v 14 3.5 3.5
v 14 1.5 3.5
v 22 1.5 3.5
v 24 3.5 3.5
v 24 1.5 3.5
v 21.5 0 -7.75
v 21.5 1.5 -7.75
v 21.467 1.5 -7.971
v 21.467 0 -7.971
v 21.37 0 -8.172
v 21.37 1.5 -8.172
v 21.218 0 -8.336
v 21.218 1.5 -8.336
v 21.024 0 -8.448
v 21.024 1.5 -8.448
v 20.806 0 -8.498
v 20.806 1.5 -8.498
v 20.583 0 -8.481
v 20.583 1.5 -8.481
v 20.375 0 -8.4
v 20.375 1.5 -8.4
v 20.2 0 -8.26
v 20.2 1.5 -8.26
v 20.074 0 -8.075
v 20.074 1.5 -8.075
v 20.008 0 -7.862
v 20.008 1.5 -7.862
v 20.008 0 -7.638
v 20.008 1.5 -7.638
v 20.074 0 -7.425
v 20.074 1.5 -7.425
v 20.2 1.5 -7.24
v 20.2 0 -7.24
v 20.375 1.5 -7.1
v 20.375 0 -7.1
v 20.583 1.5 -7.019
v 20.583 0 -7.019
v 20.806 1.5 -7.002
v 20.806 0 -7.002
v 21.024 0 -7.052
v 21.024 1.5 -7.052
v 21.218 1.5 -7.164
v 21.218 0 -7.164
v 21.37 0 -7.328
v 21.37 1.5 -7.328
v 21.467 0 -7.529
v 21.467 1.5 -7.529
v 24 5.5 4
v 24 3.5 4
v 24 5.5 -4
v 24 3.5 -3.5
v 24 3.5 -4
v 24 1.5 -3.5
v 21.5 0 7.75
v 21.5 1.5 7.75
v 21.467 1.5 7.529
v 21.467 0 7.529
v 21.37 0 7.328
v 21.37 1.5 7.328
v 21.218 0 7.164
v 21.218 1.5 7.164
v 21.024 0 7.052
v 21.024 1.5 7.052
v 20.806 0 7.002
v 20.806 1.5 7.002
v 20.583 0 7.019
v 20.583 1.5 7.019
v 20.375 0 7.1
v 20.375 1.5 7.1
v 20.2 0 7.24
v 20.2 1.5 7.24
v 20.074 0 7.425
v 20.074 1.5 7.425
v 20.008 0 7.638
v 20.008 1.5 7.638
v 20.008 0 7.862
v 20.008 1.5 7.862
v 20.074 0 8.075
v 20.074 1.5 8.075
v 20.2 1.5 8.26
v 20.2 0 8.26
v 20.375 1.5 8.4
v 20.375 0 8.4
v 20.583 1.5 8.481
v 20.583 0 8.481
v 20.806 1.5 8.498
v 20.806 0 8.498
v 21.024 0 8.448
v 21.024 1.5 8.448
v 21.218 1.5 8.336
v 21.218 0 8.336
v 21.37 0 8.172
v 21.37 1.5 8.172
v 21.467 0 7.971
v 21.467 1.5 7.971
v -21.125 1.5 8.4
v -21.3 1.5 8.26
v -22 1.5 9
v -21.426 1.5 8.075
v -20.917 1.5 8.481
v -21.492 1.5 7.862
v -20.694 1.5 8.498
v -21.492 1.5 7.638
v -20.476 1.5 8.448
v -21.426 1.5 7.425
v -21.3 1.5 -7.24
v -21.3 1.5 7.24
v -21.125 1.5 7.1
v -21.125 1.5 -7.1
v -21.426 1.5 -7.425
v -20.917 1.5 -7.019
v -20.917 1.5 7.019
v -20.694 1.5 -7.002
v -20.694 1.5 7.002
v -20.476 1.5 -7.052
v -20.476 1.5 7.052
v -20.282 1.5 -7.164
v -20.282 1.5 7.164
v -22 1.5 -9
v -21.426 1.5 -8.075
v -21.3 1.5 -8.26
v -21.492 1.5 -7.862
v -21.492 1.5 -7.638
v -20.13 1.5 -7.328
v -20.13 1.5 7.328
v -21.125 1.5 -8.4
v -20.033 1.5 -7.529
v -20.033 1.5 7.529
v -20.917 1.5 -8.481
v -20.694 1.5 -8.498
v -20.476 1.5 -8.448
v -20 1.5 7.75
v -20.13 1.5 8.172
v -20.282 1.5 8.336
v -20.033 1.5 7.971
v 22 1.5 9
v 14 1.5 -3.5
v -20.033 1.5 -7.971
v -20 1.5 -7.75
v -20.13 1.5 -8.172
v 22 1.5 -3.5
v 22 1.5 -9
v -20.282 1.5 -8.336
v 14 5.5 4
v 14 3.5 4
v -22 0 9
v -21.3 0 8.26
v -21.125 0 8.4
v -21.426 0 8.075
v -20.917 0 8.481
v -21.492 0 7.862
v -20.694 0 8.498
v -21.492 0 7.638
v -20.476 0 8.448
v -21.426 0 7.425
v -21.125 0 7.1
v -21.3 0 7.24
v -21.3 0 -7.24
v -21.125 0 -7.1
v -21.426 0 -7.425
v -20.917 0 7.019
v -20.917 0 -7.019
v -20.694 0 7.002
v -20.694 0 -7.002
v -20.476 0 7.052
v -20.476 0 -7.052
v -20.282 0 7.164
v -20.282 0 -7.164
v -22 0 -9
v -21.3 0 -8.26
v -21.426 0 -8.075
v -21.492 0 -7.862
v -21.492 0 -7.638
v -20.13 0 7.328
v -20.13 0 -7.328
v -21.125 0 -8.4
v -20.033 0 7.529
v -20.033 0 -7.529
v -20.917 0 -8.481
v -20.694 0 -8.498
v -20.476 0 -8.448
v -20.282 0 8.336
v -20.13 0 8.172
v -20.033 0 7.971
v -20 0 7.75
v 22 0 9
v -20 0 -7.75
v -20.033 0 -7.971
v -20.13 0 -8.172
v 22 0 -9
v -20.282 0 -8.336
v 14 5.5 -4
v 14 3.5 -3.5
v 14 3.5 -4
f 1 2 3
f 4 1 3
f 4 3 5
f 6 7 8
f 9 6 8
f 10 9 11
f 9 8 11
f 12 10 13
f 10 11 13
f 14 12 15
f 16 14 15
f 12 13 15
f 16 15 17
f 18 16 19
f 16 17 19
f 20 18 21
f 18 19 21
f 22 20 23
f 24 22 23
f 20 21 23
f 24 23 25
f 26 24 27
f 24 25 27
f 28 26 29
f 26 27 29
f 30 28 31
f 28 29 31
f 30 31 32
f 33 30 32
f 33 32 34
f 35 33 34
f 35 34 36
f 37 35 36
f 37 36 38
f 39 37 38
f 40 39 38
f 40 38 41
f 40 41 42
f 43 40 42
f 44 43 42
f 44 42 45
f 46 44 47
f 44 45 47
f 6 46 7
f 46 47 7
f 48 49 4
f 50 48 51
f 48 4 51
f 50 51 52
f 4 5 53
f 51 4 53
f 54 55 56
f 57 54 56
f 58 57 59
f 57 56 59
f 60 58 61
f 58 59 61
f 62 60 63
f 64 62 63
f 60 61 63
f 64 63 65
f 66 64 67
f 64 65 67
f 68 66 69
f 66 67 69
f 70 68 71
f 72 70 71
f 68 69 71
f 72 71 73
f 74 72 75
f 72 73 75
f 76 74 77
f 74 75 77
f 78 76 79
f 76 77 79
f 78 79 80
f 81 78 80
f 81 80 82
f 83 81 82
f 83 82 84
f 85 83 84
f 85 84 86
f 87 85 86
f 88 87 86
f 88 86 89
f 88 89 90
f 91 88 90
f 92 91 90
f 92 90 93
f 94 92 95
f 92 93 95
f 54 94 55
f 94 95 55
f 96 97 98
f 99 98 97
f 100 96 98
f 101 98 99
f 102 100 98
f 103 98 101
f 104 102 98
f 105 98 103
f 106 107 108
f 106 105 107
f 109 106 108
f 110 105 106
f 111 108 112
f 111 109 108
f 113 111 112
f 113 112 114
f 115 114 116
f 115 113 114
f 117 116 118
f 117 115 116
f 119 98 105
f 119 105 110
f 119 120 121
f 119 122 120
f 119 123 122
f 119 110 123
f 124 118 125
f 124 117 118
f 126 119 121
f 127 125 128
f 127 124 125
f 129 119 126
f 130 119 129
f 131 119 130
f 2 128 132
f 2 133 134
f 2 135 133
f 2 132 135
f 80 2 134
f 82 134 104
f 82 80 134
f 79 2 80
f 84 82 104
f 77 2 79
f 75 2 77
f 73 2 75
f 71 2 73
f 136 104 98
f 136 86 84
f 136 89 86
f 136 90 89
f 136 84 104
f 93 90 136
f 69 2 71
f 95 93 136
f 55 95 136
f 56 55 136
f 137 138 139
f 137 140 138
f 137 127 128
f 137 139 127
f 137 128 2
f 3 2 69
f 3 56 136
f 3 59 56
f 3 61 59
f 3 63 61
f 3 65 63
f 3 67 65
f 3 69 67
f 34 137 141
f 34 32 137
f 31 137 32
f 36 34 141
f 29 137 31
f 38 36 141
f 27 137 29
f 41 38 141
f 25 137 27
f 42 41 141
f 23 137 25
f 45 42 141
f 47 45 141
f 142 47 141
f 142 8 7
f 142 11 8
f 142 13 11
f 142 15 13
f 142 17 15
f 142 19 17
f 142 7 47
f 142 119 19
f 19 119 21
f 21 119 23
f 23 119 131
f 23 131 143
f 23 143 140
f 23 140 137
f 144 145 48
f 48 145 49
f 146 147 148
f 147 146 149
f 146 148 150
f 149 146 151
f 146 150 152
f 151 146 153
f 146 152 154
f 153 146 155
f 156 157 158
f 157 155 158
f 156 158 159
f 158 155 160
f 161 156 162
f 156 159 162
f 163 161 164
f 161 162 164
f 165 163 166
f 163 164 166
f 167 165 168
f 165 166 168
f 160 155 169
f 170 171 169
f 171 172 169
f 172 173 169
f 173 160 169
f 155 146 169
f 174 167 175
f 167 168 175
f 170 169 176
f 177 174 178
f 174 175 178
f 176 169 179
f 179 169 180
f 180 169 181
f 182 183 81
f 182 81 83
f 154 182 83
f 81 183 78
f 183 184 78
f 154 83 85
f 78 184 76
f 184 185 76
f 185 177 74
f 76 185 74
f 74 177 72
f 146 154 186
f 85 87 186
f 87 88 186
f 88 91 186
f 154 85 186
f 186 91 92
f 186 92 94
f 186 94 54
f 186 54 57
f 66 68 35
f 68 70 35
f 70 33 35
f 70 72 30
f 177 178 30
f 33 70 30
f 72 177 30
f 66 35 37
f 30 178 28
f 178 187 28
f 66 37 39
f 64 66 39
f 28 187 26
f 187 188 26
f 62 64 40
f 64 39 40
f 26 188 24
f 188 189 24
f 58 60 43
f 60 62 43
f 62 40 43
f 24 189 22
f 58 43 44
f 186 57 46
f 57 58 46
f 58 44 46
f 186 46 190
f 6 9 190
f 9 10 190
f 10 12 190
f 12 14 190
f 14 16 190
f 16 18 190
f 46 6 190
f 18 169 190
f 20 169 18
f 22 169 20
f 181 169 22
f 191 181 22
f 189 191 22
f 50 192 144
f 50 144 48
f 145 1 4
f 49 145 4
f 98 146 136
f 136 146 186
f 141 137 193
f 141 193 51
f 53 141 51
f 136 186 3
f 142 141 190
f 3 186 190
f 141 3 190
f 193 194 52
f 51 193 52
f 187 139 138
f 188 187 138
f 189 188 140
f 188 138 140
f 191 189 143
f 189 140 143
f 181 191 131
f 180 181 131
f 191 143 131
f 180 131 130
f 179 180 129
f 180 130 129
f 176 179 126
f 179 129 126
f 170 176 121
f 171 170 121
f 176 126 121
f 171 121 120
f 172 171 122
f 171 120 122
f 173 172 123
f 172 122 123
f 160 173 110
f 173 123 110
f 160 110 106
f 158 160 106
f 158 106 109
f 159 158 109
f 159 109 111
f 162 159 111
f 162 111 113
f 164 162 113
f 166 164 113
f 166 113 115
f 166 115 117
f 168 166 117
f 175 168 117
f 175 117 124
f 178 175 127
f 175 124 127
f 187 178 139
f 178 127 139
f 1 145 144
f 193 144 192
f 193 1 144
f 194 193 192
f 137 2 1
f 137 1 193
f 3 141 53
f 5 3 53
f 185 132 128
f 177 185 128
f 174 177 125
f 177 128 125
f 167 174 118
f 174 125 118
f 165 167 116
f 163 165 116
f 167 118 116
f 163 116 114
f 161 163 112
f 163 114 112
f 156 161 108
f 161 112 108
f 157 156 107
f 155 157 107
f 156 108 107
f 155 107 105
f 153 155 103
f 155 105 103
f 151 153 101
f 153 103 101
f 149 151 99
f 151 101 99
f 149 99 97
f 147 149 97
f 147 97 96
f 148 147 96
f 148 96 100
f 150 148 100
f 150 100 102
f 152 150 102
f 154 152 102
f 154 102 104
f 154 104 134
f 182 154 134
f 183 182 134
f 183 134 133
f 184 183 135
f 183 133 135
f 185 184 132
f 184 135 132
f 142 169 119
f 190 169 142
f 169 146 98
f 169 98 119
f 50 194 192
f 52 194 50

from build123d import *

# Parameters (mm, degrees)
SCHIZZO1_W                   = 44
SCHIZZO1_H                   = 18
ESTRUSIONE_ESTRUSIONE1_DEPTH = 1.5
SCHIZZO2_R                   = 0.75
TAGLIO_ESTRUSIONE1_DEPTH     = 1.5
SCHIZZO4_W                   = 10
SCHIZZO4_H                   = 7
ESTRUSIONE_ESTRUSIONE2_DEPTH = 2
SCHIZZO5_W                   = 10
SCHIZZO5_H                   = 8
ESTRUSIONE_ESTRUSIONE3_DEPTH = 2


with BuildPart() as part:
    # Schizzo1 → Estrusione-Estrusione1 (new body)
    with BuildSketch(Plane(origin=(0, 0, 0), x_dir=(1, 0, 0), z_dir=(0, 1, 0))):
        Rectangle(SCHIZZO1_W, SCHIZZO1_H)
    extrude(amount=ESTRUSIONE_ESTRUSIONE1_DEPTH)

    # Schizzo2 → Taglio-Estrusione1 (cut)
    with BuildSketch(Plane(origin=(0, 1.5, 0), x_dir=(1, 0, 0), z_dir=(0, 1, 0))):
        with Locations((-20.75, 7.75)):
            Circle(SCHIZZO2_R)
        with Locations((20.75, 7.75)):
            Circle(SCHIZZO2_R)
        with Locations((20.75, -7.75)):
            Circle(SCHIZZO2_R)
        with Locations((-20.75, -7.75)):
            Circle(SCHIZZO2_R)
    extrude(amount=-TAGLIO_ESTRUSIONE1_DEPTH, mode=Mode.SUBTRACT)

    # Schizzo4 → Estrusione-Estrusione2 (add)
    with BuildSketch(Plane(origin=(0, 1.5, 0), x_dir=(1, 0, 0), z_dir=(0, 1, 0))):
        with Locations((19, 0)):
            Rectangle(SCHIZZO4_W, SCHIZZO4_H)
    extrude(amount=ESTRUSIONE_ESTRUSIONE2_DEPTH)

    # Schizzo5 → Estrusione-Estrusione3 (add)
    with BuildSketch(Plane(origin=(0, 3.5, 0), x_dir=(1, 0, 0), z_dir=(0, 1, 0))):
        with Locations((19, 0)):
            Rectangle(SCHIZZO5_W, SCHIZZO5_H)
    extrude(amount=ESTRUSIONE_ESTRUSIONE3_DEPTH)


solid = part.part
